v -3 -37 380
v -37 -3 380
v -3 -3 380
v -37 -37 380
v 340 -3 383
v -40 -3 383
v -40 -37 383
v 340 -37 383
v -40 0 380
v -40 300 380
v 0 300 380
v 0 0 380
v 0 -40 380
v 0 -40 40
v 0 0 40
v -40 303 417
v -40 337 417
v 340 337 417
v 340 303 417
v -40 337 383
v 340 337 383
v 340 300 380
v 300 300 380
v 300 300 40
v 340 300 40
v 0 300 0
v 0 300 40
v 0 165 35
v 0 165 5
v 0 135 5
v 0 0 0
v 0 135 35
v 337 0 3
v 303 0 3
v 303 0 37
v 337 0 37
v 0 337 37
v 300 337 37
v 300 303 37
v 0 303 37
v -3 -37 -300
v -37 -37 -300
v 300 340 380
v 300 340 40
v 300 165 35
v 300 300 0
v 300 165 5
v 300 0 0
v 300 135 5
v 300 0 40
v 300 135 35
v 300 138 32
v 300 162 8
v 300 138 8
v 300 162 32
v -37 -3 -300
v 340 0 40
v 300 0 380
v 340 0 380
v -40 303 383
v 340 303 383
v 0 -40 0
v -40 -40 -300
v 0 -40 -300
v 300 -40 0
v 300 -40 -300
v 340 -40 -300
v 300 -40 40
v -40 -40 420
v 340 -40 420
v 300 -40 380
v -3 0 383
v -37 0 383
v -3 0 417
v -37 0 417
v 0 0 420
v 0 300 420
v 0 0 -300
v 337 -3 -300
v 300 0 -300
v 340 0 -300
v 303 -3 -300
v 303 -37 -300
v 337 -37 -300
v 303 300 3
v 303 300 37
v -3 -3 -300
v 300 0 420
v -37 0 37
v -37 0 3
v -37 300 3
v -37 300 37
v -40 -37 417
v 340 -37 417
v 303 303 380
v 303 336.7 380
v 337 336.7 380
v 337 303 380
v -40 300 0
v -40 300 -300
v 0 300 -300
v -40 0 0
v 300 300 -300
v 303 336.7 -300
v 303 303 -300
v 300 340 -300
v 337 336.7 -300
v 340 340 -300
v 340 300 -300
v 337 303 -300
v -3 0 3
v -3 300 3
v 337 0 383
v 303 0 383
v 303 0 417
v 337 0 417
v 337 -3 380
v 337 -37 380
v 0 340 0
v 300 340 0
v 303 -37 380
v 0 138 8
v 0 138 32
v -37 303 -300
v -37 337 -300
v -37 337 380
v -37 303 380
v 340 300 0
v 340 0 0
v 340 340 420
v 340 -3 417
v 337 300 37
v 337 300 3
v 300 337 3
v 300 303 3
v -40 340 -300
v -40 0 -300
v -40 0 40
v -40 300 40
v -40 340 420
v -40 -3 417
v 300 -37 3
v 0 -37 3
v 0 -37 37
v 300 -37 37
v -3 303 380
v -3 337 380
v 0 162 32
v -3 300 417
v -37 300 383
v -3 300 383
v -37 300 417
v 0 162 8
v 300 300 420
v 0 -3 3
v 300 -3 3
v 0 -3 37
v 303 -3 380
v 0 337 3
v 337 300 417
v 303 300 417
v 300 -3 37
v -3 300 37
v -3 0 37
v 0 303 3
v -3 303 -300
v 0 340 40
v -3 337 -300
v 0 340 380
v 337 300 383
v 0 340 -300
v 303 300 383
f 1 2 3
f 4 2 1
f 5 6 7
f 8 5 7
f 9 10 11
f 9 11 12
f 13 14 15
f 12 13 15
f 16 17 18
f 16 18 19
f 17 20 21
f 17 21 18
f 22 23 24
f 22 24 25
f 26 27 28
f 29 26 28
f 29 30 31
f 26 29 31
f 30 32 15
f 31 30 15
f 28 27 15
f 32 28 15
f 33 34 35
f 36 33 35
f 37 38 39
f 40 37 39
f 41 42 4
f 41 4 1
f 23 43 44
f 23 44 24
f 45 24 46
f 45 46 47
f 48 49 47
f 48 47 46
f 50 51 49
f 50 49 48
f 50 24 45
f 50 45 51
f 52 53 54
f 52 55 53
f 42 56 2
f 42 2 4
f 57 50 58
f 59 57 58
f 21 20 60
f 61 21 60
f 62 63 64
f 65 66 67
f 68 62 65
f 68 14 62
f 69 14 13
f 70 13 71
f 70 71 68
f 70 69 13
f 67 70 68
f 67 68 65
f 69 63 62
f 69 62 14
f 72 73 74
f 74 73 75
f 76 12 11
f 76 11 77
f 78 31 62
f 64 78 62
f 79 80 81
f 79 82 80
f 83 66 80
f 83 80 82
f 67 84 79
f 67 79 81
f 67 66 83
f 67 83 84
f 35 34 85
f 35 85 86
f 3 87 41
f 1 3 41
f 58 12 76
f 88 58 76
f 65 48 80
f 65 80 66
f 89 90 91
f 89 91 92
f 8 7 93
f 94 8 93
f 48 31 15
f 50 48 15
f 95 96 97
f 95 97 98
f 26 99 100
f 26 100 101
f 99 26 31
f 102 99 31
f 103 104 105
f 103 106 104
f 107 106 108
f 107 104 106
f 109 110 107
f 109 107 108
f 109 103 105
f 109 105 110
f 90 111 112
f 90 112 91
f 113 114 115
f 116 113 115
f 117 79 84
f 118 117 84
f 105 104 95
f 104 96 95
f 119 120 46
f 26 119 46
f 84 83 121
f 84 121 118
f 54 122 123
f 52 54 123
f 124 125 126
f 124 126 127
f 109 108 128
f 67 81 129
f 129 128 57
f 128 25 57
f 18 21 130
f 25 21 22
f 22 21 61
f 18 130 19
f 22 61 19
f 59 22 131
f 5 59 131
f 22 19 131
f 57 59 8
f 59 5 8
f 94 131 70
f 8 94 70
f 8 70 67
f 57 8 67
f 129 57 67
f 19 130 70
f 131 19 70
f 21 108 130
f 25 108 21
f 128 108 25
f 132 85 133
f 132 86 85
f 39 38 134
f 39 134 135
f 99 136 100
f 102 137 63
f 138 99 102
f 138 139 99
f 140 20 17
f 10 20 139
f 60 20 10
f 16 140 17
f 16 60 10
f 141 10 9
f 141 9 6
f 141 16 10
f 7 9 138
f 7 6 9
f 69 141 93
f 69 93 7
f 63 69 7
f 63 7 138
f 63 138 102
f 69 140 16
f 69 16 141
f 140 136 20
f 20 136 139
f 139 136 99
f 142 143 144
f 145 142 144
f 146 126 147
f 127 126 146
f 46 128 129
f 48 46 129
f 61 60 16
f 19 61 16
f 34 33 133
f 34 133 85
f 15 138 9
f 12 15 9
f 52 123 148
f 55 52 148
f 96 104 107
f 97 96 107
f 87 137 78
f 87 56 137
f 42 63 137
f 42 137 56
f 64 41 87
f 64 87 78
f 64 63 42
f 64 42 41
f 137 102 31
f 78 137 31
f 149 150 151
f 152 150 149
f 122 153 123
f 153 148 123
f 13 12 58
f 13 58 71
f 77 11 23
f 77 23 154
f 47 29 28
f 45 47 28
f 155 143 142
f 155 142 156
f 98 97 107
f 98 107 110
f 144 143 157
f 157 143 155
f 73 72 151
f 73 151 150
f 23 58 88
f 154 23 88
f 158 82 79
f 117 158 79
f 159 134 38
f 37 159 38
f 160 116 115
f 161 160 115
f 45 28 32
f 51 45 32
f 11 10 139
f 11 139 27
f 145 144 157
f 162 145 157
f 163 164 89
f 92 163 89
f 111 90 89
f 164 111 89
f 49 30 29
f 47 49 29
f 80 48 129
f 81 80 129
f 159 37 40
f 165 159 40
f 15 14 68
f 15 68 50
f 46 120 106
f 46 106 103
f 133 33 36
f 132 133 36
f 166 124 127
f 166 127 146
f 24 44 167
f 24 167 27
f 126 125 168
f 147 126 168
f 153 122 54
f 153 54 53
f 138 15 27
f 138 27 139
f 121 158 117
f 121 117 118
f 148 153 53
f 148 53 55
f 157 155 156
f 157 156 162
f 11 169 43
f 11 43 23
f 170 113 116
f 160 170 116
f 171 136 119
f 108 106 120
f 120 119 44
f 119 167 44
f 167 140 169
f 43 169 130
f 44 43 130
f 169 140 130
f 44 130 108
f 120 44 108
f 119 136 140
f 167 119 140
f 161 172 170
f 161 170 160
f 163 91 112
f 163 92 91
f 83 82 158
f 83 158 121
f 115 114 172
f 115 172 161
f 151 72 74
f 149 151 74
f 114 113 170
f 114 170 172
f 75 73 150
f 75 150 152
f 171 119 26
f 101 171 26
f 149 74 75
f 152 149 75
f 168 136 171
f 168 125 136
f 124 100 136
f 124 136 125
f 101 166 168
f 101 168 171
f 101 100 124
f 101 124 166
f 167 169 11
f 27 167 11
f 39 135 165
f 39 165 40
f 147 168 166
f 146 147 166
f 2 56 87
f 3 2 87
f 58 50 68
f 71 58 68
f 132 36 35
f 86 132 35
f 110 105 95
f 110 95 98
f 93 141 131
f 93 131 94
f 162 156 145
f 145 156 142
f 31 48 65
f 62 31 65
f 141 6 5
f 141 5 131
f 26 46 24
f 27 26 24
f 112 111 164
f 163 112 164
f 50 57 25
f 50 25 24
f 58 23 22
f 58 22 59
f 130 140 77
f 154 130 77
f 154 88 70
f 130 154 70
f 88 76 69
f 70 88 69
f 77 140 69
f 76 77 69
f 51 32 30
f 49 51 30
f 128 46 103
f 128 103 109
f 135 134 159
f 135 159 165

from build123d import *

# Parameters (mm, degrees)
F0_W      = 40
F0_H      = 40
F0_W_2    = 34
F0_H_2    = 34
F1_DEPTH  = 380
F2_W      = 40
F2_H      = 40
F2_W_2    = 34
F2_H_2    = 34
F3_DEPTH  = 300
F4_W      = 40
F4_H      = 40
F4_W_2    = 34
F4_H_2    = 34
F5_DEPTH  = 380
F6_W      = 40
F6_H      = 40
F6_W_2    = 34
F6_H_2    = 34
F7_DEPTH  = 380
F8_W      = 40
F8_H      = 40
F8_W_2    = 34
F8_H_2    = 34
F9_DEPTH  = 300
F10_W     = 40
F10_H     = 40
F10_W_2   = 34
F10_H_2   = 34
F11_DEPTH = 300
F12_W     = 40
F12_H     = 40
F12_W_2   = 34
F12_H_2   = 34
F13_DEPTH = 300
F14_W     = 40
F14_H     = 40
F14_W_2   = 34
F14_H_2   = 34
F15_DEPTH = 300
F16_W     = 40
F16_H     = 40
F16_W_2   = 34
F16_H_2   = 34
F17_DEPTH = 380
F18_W     = 40
F18_H     = 40
F18_W_2   = 34
F18_H_2   = 33.7004394531
F19_DEPTH = 380
F20_W     = 40
F20_H     = 40
F20_W_2   = 34
F20_H_2   = 34
F21_DEPTH = 380
F22_DEPTH = 25
F23_W     = 40
F23_H     = 40
F23_W_2   = 34
F23_H_2   = 34
F24_DEPTH = 300
F25_W     = 40
F25_H     = 40
F25_W_2   = 34
F25_H_2   = 34
F26_DEPTH = 300
F27_W     = 40
F27_H     = 40
F27_W_2   = 34
F27_H_2   = 34
F28_DEPTH = 300
F29_W     = 40
F29_H     = 40
F29_W_2   = 34
F29_H_2   = 33.7004394531
F31_DEPTH = 300
F32_W     = 40
F32_H     = 40
F32_W_2   = 34
F32_H_2   = 34
F33_DEPTH = 300
F34_W     = 24
F34_H     = 24
F35_DEPTH = 300


with BuildPart() as f1:
    # F0 (on Top) → F1 (new body)
    with BuildSketch(Plane.XY):
        with Locations((-20, -20)):
            Rectangle(F0_W, F0_H)
        with Locations((-20, -20)):
            Rectangle(F0_W_2, F0_H_2, mode=Mode.SUBTRACT)
    extrude(amount=F1_DEPTH)

    # F2 (on face) → F3 (join)
    with BuildSketch(Plane.YZ):
        with Locations((-20, 20)):
            Rectangle(F2_W, F2_H)
        with Locations((-20, 20)):
            Rectangle(F2_W_2, F2_H_2, mode=Mode.SUBTRACT)
    extrude(amount=F3_DEPTH)

    # F4 (on face) → F5 (join)
    with BuildSketch(Plane(origin=(0, 0, 0), x_dir=(1, 0, 0), z_dir=(0, 0, -1))):
        with Locations((320, 20)):
            Rectangle(F4_W, F4_H)
        with Locations((320, 20)):
            Rectangle(F4_W_2, F4_H_2, mode=Mode.SUBTRACT)
    extrude(amount=-F5_DEPTH)

    # F6 (on face) → F7 (join)
    with BuildSketch(Plane(origin=(-40, 0, 0), x_dir=(0, -1, 0), z_dir=(-1, 0, 0))):
        with Locations((20, 400)):
            Rectangle(F6_W, F6_H)
        with Locations((20, 400)):
            Rectangle(F6_W_2, F6_H_2, mode=Mode.SUBTRACT)
    extrude(amount=-F7_DEPTH)

    # F8 (on face) → F9 (join)
    with BuildSketch(Plane(origin=(0, 0, 0), x_dir=(-1, 0, 0), z_dir=(0, 1, 0))):
        with Locations((20, 20)):
            Rectangle(F8_W, F8_H)
        with Locations((20, 20)):
            Rectangle(F8_W_2, F8_H_2, mode=Mode.SUBTRACT)
    extrude(amount=F9_DEPTH)

    # F10 (on face) → F11 (join)
    with BuildSketch(Plane(origin=(0, 0, 0), x_dir=(-1, 0, 0), z_dir=(0, 1, 0))):
        with Locations((-320, 20)):
            Rectangle(F10_W, F10_H)
        with Locations((-320, 20)):
            Rectangle(F10_W_2, F10_H_2, mode=Mode.SUBTRACT)
    extrude(amount=F11_DEPTH)

    # F12 (on face) → F13 (join)
    with BuildSketch(Plane(origin=(0, 0, 0), x_dir=(-1, 0, 0), z_dir=(0, 1, 0))):
        with Locations((-320, 400)):
            Rectangle(F12_W, F12_H)
        with Locations((-320, 400)):
            Rectangle(F12_W_2, F12_H_2, mode=Mode.SUBTRACT)
    extrude(amount=F13_DEPTH)

    # F14 (on face) → F15 (join)
    with BuildSketch(Plane(origin=(0, 0, 0), x_dir=(-1, 0, 0), z_dir=(0, 1, 0))):
        with Locations((20, 400)):
            Rectangle(F14_W, F14_H)
        with Locations((20, 400)):
            Rectangle(F14_W_2, F14_H_2, mode=Mode.SUBTRACT)
    extrude(amount=F15_DEPTH)

    # F16 (on face) → F17 (join)
    with BuildSketch(Plane(origin=(-40, 0, 0), x_dir=(0, -1, 0), z_dir=(-1, 0, 0))):
        with Locations((-320, 400)):
            Rectangle(F16_W, F16_H)
        with Locations((-320, 400)):
            Rectangle(F16_W_2, F16_H_2, mode=Mode.SUBTRACT)
    extrude(amount=-F17_DEPTH)

    # F18 (on face) → F19 (join)
    with BuildSketch(Plane(origin=(0, 0, 380), x_dir=(1, 0, 0), z_dir=(0, 0, -1))):
        with Locations((320, -320)):
            Rectangle(F18_W, F18_H)
        with Locations((320, -319.8502197266)):
            Rectangle(F18_W_2, F18_H_2, mode=Mode.SUBTRACT)
    extrude(amount=F19_DEPTH)

    # F20 (on face) → F21 (join)
    with BuildSketch(Plane(origin=(0, 0, 380), x_dir=(1, 0, 0), z_dir=(0, 0, -1))):
        with Locations((-20, -320)):
            Rectangle(F20_W, F20_H)
        with Locations((-20, -320)):
            Rectangle(F20_W_2, F20_H_2, mode=Mode.SUBTRACT)
    extrude(amount=F21_DEPTH)

    # F20 (on face) → F22 (join)
    with BuildSketch(Plane(origin=(0, 0, 380), x_dir=(1, 0, 0), z_dir=(0, 0, -1))):
        with Locations((-20, -320)):
            Rectangle(F20_W, F20_H)
        with Locations((-20, -320)):
            Rectangle(F20_W_2, F20_H_2, mode=Mode.SUBTRACT)
    extrude(amount=F22_DEPTH)

    # F23 (on face) → F24 (join)
    with BuildSketch(Plane(origin=(300, 0, 0), x_dir=(0, -1, 0), z_dir=(-1, 0, 0))):
        with Locations((-320, 20)):
            Rectangle(F23_W, F23_H)
        with Locations((-320, 20)):
            Rectangle(F23_W_2, F23_H_2, mode=Mode.SUBTRACT)
    extrude(amount=F24_DEPTH)

    # F25 (on face) → F26 (join)
    with BuildSketch(Plane(origin=(0, 0, 0), x_dir=(1, 0, 0), z_dir=(0, 0, -1))):
        with Locations((-20, 20)):
            Rectangle(F25_W, F25_H)
        with Locations((-20, 20)):
            Rectangle(F25_W_2, F25_H_2, mode=Mode.SUBTRACT)
    extrude(amount=F26_DEPTH)

    # F27 (on face) → F28 (join)
    with BuildSketch(Plane(origin=(0, 0, 0), x_dir=(1, 0, 0), z_dir=(0, 0, -1))):
        with Locations((320, 20)):
            Rectangle(F27_W, F27_H)
        with Locations((320, 20)):
            Rectangle(F27_W_2, F27_H_2, mode=Mode.SUBTRACT)
    extrude(amount=F28_DEPTH)

    # F29 (on face) → F31 (join)
    with BuildSketch(Plane(origin=(0, 0, 0), x_dir=(1, 0, 0), z_dir=(0, 0, -1))):
        with Locations((320, -320)):
            Rectangle(F29_W, F29_H)
        with Locations((320, -319.8502197266)):
            Rectangle(F29_W_2, F29_H_2, mode=Mode.SUBTRACT)
    extrude(amount=F31_DEPTH)

    # F32 (on face) → F33 (join)
    with BuildSketch(Plane(origin=(0, 0, 0), x_dir=(1, 0, 0), z_dir=(0, 0, -1))):
        with Locations((-20, -320)):
            Rectangle(F32_W, F32_H)
        with Locations((-20, -320)):
            Rectangle(F32_W_2, F32_H_2, mode=Mode.SUBTRACT)
    extrude(amount=F33_DEPTH)

    # F34 (on face) → F35 (join)
    with BuildSketch(Plane.YZ):
        Polygon((165, 35), (150, 35), (135, 35), (135, 5), (165, 5), align=None)
        with Locations((150, 20)):
            Rectangle(F34_W, F34_H, mode=Mode.SUBTRACT)
    extrude(amount=F35_DEPTH)


solid = f1.part
